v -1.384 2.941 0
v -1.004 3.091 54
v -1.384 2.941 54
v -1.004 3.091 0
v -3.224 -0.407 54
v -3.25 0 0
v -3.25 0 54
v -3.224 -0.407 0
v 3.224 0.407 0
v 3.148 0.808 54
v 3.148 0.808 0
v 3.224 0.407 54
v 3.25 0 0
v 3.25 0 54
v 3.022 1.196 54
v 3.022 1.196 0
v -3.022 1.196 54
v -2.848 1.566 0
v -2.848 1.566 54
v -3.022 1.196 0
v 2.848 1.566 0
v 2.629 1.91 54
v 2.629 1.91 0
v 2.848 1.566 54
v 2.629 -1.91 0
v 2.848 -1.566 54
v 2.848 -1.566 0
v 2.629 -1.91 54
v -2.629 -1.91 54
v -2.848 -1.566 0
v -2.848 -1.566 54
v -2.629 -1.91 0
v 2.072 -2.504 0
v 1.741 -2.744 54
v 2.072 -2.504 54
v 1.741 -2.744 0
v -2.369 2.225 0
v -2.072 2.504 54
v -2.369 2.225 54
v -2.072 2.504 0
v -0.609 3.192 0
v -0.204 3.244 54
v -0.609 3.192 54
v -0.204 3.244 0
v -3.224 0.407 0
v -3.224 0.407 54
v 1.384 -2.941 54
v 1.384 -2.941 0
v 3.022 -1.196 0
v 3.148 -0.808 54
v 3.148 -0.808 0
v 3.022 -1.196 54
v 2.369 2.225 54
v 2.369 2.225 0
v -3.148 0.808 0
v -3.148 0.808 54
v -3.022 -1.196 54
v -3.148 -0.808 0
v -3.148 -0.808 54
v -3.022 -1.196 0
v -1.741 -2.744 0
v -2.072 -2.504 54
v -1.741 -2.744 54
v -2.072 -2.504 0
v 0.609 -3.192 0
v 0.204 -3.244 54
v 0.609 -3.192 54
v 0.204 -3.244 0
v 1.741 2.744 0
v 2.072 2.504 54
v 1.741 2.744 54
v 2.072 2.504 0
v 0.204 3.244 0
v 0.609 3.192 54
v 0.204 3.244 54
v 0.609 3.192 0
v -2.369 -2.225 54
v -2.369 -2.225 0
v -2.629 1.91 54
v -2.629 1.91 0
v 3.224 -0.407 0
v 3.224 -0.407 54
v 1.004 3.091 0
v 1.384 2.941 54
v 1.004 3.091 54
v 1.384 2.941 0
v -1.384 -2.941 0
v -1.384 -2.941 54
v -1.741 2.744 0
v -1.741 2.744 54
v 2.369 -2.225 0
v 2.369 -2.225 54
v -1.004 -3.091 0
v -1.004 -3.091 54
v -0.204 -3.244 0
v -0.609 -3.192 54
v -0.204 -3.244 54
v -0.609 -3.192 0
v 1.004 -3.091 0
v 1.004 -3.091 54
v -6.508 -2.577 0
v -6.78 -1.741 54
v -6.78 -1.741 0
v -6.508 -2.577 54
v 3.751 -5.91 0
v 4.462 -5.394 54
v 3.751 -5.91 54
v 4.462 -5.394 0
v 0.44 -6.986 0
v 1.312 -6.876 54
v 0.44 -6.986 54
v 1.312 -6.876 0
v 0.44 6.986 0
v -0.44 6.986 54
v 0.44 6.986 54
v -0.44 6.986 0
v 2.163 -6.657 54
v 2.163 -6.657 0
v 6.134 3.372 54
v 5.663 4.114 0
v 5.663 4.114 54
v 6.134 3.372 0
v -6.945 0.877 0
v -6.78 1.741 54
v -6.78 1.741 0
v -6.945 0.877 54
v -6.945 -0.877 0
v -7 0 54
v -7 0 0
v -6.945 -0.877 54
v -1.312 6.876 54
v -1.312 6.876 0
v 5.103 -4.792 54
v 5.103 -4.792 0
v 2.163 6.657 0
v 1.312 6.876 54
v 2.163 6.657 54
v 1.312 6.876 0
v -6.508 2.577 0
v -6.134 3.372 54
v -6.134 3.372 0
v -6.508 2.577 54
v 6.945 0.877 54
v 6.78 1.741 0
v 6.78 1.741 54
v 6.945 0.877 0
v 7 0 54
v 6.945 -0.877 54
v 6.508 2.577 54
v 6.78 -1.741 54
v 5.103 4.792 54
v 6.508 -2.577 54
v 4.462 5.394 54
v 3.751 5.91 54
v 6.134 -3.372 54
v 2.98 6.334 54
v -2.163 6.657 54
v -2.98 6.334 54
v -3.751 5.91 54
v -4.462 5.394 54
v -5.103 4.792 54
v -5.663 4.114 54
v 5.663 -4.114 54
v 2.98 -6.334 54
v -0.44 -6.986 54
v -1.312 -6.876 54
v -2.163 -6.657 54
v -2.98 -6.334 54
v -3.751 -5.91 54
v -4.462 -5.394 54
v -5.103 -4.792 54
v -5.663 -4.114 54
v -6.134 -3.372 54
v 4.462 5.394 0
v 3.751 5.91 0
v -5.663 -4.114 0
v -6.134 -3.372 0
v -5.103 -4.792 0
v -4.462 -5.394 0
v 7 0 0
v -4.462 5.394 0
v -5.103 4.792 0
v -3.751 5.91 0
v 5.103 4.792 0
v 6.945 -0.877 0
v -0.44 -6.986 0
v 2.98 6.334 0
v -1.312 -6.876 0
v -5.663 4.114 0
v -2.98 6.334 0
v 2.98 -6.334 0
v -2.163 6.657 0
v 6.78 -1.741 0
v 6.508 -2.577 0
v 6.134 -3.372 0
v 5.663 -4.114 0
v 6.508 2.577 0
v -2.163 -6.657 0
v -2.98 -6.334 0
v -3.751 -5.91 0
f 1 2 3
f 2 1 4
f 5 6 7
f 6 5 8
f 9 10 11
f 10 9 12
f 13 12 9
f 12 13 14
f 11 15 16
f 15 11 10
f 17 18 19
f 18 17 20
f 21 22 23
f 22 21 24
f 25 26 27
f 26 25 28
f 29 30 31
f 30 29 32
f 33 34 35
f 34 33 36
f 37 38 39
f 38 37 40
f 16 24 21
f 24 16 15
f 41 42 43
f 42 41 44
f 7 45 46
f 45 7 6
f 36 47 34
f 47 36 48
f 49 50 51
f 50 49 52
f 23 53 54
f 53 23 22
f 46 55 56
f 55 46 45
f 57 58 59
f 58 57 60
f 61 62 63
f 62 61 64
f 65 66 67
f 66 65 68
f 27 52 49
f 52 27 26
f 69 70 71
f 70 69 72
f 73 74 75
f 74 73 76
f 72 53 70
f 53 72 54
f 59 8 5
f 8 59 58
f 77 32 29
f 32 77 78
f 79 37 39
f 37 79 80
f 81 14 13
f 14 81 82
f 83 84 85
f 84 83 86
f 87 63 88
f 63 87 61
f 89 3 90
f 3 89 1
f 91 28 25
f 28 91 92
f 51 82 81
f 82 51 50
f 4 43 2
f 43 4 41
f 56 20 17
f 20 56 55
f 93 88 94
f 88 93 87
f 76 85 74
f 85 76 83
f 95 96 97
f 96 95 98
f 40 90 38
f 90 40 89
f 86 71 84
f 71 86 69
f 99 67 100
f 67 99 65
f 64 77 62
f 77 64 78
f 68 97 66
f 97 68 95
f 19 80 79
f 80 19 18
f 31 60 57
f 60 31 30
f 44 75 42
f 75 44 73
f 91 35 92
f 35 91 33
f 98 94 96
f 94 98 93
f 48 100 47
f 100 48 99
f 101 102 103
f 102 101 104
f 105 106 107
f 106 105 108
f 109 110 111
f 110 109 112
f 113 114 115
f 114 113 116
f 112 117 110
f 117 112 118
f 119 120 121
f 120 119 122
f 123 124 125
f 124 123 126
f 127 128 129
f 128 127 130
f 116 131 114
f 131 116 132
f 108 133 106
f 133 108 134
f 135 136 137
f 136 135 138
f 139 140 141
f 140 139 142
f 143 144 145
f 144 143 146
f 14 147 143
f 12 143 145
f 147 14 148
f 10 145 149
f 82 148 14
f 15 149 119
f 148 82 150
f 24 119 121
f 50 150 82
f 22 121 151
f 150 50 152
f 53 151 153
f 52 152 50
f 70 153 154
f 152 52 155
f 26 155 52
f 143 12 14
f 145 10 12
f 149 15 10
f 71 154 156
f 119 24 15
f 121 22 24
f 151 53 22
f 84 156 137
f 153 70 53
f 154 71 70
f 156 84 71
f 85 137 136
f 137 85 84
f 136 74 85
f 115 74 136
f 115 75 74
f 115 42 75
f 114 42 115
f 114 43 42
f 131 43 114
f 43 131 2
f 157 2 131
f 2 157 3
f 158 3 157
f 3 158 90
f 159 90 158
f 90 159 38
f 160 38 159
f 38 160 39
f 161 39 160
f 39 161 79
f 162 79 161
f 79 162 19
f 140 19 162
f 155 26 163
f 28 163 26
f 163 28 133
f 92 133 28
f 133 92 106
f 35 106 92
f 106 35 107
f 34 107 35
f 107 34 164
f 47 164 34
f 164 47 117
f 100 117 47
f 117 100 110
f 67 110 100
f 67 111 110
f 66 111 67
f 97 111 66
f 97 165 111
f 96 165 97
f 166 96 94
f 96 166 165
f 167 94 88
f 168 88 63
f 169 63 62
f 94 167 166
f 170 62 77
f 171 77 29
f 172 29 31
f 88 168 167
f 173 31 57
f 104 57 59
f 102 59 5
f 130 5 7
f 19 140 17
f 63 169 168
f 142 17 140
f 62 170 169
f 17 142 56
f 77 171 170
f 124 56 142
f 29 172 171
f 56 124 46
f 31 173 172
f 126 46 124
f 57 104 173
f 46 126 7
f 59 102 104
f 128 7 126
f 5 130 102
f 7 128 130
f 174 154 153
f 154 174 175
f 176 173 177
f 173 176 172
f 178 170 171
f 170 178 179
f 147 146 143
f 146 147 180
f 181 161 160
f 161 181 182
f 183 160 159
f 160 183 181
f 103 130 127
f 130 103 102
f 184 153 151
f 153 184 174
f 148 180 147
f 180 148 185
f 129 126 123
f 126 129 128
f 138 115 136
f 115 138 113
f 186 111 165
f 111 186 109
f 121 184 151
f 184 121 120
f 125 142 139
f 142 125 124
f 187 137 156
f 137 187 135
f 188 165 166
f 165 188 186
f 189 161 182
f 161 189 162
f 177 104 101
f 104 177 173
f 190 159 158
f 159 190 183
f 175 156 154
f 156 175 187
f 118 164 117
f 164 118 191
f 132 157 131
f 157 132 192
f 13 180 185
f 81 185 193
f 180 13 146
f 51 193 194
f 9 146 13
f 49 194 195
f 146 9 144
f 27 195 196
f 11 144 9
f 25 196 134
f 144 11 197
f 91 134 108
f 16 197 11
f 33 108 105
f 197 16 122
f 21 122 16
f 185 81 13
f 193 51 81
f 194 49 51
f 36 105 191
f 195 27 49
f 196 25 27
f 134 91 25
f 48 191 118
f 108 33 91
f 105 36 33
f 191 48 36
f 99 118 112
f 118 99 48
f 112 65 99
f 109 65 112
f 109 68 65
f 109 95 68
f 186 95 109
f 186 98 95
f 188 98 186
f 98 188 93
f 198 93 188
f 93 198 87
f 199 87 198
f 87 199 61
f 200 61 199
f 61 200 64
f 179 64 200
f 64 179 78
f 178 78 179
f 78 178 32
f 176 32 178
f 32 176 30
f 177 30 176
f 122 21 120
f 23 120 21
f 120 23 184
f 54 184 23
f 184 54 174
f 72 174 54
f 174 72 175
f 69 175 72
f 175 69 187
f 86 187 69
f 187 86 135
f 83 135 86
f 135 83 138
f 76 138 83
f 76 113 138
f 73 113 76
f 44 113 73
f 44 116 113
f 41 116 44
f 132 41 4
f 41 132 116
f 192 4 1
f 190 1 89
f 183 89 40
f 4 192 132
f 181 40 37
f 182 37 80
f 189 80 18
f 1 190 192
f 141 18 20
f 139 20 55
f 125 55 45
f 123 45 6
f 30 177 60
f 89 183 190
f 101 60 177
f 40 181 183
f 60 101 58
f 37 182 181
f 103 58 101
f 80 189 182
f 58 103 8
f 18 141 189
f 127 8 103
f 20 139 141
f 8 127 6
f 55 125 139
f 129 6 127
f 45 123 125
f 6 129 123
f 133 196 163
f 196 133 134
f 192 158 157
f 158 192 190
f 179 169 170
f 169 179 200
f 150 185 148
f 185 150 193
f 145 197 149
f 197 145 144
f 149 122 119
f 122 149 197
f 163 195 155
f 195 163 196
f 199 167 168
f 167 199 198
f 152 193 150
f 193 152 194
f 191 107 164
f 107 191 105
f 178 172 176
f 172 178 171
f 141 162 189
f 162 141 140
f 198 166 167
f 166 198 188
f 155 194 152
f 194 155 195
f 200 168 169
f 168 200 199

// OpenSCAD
$fn = 50;


difference() {
	union() {
		cylinder(h = 54, r = 7.0000000000);
	}
	union() {
		translate(v = [0.0000000000, 0.0000000000, -100.0000000000]) {
			cylinder(h = 200, r = 3.2500000000);
		}
		translate(v = [0.0000000000, 0.0000000000, -100.0000000000]) {
			cylinder(h = 200, r = 3.2500000000);
		}
		translate(v = [0.0000000000, 0.0000000000, -100.0000000000]) {
			cylinder(h = 200, r = 3.2500000000);
		}
		translate(v = [0.0000000000, 0.0000000000, -100.0000000000]) {
			cylinder(h = 200, r = 3.2500000000);
		}
	}
}
